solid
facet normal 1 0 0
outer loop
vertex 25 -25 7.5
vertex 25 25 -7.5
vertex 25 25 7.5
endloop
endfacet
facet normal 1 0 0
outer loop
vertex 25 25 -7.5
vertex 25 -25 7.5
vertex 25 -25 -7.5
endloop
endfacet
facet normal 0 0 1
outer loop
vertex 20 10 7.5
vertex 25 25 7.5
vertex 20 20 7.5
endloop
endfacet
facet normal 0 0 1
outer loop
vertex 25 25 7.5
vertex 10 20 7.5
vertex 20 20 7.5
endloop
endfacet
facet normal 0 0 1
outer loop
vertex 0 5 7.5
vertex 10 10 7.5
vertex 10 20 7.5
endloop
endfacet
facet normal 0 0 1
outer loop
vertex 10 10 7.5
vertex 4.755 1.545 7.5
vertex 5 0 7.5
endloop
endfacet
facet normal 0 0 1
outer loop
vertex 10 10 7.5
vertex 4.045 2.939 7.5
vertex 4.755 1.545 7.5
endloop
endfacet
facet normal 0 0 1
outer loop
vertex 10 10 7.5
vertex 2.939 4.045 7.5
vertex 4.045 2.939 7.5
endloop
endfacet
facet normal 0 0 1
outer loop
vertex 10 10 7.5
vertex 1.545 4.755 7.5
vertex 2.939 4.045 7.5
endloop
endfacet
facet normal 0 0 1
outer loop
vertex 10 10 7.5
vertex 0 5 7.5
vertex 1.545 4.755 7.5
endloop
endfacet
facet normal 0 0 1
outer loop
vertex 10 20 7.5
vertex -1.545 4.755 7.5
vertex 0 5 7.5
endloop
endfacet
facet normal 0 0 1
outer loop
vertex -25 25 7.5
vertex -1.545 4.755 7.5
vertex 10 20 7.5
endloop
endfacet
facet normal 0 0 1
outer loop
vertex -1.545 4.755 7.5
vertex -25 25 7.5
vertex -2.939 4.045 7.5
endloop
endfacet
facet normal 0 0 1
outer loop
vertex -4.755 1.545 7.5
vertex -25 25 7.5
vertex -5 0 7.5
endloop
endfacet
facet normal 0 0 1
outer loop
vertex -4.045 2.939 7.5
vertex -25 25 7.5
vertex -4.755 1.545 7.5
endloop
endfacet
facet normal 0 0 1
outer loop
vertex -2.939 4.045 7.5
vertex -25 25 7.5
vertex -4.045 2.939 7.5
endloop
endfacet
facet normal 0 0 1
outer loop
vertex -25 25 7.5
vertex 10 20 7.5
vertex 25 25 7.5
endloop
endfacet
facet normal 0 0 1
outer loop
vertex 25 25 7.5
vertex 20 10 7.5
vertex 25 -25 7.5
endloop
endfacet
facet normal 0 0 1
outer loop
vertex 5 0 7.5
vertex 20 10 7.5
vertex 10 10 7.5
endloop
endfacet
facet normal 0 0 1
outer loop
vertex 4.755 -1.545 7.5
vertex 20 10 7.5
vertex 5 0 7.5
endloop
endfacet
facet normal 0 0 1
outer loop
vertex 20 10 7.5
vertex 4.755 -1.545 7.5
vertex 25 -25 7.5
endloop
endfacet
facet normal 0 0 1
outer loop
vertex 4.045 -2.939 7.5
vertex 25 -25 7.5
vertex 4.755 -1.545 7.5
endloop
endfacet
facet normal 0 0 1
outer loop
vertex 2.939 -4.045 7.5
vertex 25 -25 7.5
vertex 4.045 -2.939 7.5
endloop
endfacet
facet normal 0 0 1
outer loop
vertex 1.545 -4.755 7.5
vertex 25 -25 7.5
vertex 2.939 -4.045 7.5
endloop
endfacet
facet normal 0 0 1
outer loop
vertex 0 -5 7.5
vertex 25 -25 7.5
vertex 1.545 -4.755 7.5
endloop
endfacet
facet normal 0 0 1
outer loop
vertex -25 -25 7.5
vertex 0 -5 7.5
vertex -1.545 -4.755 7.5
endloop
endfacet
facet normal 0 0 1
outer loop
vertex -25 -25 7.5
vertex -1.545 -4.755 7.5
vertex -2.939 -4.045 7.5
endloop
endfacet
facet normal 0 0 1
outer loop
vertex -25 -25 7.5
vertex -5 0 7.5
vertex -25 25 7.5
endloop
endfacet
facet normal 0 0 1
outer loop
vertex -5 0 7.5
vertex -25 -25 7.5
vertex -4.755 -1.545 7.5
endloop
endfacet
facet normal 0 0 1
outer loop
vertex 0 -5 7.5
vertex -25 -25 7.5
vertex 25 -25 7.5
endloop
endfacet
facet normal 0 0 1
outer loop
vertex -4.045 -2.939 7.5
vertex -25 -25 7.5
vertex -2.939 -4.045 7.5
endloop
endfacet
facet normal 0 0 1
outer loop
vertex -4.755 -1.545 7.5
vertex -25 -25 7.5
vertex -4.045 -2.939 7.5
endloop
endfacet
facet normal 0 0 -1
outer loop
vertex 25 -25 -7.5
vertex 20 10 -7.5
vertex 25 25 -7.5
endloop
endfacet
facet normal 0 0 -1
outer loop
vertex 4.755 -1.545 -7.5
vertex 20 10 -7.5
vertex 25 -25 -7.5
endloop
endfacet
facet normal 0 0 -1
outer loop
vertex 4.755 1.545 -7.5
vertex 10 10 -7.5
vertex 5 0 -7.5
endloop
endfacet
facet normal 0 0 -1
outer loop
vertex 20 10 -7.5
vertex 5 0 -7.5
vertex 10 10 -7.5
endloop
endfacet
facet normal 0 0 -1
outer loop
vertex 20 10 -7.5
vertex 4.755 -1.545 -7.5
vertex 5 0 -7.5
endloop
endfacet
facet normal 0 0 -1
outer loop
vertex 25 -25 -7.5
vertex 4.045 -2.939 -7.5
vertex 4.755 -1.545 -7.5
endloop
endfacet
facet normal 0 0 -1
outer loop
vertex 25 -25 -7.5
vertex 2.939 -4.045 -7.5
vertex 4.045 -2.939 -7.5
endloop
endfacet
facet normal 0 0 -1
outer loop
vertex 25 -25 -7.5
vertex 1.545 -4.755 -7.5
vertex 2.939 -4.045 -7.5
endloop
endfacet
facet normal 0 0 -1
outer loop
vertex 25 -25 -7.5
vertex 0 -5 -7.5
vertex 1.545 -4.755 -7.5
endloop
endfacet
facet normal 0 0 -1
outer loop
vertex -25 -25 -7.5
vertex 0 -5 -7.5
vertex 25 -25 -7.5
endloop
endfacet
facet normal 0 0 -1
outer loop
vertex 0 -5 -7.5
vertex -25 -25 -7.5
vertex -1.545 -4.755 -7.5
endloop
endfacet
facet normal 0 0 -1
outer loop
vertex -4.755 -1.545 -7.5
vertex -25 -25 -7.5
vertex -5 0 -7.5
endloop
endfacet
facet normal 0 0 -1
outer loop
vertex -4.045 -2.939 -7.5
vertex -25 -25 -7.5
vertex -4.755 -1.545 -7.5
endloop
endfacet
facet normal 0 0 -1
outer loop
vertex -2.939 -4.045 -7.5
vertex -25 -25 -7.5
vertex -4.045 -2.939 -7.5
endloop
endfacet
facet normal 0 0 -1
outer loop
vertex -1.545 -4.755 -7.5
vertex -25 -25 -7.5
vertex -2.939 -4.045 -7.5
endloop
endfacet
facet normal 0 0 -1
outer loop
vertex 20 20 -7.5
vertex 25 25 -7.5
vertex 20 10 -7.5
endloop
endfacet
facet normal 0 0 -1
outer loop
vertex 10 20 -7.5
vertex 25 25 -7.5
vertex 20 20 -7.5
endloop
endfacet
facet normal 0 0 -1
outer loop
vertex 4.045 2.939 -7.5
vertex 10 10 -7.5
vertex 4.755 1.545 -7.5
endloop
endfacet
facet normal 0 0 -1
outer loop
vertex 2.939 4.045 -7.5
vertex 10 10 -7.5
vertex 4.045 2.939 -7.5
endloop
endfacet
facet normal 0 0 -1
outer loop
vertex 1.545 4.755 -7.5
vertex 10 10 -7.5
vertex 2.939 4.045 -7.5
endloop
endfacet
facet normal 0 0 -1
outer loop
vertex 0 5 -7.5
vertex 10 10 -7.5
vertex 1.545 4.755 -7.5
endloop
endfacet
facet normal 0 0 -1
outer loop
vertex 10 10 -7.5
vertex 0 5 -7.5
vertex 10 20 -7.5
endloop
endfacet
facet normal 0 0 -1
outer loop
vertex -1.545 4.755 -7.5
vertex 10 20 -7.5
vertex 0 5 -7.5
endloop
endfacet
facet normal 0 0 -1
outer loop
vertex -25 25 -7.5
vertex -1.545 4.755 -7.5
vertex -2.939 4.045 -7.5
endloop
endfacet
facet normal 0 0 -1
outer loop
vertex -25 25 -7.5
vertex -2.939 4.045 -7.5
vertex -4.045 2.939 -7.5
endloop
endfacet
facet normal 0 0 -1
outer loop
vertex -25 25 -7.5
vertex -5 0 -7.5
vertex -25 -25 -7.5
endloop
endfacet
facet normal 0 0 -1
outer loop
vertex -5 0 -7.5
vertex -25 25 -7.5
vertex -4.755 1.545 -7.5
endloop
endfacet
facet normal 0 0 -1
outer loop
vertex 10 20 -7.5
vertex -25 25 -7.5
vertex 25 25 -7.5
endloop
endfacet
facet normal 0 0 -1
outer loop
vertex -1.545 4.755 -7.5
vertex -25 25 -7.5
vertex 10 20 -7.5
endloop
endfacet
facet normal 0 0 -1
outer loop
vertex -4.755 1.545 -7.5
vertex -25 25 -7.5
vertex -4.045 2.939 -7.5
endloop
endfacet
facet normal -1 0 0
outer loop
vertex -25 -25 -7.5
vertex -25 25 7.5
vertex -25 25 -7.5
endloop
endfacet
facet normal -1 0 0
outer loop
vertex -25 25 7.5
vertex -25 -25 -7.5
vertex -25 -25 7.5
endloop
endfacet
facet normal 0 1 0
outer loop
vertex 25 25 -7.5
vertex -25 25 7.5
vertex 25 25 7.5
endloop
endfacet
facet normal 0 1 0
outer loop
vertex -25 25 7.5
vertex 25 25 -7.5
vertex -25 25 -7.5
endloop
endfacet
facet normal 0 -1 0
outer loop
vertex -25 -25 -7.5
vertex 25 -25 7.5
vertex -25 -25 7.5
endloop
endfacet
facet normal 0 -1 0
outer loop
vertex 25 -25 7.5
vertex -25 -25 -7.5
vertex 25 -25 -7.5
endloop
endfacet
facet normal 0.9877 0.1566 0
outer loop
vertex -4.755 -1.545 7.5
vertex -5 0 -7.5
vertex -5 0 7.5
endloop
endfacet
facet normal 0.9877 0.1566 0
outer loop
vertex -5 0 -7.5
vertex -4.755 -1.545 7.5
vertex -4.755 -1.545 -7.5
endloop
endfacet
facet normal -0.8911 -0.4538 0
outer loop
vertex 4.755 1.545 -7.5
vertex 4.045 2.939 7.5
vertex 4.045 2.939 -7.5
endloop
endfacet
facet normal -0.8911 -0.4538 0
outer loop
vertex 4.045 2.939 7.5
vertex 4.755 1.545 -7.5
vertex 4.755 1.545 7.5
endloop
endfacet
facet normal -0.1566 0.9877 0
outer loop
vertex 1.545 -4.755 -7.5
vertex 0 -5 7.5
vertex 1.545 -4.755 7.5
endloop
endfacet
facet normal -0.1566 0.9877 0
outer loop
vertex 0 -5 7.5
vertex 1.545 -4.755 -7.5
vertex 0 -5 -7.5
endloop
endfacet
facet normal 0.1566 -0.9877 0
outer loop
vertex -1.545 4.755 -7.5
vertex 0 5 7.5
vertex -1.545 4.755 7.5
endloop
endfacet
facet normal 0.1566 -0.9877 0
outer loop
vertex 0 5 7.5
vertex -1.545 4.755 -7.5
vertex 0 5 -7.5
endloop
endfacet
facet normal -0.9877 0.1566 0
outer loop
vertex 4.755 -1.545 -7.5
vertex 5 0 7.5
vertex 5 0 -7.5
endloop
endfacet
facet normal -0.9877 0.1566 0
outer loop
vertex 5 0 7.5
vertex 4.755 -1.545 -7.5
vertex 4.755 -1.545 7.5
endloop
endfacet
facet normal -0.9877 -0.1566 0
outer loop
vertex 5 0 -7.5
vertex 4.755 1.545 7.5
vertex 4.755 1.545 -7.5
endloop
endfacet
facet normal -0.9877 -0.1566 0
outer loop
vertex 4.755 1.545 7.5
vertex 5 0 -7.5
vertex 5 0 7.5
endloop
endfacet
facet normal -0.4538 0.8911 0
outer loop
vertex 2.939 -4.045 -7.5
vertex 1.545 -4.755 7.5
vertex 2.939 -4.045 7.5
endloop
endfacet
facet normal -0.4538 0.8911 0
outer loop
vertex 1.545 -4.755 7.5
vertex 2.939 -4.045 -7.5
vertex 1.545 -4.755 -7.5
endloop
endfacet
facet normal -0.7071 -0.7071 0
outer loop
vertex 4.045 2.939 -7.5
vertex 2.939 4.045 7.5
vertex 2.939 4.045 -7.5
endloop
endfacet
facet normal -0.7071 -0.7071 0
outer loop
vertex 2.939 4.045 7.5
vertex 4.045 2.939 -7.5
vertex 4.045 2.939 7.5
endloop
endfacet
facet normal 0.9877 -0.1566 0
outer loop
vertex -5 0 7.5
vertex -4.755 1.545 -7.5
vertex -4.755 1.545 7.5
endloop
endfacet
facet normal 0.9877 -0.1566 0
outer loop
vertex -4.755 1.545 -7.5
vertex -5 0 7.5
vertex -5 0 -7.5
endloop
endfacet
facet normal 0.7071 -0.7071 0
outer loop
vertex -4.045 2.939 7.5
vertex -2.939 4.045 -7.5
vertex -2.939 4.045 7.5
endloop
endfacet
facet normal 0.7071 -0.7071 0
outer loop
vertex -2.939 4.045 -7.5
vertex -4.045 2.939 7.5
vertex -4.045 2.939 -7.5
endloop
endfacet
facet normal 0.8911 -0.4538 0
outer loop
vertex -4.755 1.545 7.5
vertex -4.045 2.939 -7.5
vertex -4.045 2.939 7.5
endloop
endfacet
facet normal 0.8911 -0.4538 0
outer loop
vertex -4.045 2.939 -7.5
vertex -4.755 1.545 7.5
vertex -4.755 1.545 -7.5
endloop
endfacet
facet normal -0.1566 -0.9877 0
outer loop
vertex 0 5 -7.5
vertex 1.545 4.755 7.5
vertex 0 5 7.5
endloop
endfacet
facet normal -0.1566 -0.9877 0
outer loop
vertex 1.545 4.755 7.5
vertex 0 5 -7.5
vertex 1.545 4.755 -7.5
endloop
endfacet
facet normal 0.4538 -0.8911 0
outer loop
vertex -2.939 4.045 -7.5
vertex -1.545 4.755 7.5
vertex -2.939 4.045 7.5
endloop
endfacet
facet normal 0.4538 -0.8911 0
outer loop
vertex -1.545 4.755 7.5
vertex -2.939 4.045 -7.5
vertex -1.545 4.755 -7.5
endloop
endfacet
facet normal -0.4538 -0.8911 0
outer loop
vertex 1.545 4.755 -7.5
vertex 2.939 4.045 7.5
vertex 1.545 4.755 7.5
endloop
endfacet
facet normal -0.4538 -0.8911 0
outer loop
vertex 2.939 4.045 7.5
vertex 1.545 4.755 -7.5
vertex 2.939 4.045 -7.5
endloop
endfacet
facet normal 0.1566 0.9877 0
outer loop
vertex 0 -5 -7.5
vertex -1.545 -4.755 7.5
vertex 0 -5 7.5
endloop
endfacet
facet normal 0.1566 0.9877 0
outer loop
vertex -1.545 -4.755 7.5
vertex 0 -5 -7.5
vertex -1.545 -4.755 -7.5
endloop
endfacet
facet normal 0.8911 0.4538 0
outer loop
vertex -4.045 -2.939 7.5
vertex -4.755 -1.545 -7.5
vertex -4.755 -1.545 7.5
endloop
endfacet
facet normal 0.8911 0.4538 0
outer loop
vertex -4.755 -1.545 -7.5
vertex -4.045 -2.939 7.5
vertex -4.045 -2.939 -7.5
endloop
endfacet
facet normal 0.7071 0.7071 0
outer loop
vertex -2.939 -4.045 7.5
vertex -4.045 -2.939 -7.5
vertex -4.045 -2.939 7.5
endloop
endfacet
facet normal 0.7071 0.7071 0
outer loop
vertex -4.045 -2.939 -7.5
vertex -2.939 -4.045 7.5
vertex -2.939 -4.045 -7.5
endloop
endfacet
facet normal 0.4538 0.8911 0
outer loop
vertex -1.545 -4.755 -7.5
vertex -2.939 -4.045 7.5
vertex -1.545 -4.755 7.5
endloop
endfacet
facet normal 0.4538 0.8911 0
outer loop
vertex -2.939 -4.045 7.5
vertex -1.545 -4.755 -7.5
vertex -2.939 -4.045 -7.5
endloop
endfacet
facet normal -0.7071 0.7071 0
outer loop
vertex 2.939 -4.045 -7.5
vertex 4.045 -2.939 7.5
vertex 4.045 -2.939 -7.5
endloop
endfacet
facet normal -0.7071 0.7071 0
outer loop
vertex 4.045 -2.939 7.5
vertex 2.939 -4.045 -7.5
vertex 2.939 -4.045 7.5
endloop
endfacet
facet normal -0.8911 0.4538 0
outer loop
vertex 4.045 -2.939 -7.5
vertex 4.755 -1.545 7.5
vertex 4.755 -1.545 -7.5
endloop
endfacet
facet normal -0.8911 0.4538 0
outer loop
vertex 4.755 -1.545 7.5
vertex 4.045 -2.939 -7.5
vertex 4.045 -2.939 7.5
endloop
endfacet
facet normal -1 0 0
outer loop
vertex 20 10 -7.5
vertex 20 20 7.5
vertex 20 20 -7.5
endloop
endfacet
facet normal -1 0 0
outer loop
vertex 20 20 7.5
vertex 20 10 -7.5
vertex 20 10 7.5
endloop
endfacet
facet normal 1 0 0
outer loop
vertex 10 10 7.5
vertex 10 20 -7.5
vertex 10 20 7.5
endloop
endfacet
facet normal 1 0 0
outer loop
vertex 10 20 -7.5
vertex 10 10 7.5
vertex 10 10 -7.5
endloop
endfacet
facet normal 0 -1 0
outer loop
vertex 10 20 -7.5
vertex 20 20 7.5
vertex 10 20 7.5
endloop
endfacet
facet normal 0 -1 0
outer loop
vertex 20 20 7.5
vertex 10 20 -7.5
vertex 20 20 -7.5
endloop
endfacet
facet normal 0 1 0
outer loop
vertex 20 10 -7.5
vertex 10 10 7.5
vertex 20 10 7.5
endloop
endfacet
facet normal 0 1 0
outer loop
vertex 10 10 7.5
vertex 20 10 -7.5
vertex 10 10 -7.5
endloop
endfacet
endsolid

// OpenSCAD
$fn = 20;

difference() {
    resize([50, 50, 15], convexity = 2) {
        difference() {
            cube([10, 10, 5], center = true);
            cylinder(8, center = true);
        }
    }
    translate([15, 15, 0]) cube([10, 10, 20], center = true);
}
